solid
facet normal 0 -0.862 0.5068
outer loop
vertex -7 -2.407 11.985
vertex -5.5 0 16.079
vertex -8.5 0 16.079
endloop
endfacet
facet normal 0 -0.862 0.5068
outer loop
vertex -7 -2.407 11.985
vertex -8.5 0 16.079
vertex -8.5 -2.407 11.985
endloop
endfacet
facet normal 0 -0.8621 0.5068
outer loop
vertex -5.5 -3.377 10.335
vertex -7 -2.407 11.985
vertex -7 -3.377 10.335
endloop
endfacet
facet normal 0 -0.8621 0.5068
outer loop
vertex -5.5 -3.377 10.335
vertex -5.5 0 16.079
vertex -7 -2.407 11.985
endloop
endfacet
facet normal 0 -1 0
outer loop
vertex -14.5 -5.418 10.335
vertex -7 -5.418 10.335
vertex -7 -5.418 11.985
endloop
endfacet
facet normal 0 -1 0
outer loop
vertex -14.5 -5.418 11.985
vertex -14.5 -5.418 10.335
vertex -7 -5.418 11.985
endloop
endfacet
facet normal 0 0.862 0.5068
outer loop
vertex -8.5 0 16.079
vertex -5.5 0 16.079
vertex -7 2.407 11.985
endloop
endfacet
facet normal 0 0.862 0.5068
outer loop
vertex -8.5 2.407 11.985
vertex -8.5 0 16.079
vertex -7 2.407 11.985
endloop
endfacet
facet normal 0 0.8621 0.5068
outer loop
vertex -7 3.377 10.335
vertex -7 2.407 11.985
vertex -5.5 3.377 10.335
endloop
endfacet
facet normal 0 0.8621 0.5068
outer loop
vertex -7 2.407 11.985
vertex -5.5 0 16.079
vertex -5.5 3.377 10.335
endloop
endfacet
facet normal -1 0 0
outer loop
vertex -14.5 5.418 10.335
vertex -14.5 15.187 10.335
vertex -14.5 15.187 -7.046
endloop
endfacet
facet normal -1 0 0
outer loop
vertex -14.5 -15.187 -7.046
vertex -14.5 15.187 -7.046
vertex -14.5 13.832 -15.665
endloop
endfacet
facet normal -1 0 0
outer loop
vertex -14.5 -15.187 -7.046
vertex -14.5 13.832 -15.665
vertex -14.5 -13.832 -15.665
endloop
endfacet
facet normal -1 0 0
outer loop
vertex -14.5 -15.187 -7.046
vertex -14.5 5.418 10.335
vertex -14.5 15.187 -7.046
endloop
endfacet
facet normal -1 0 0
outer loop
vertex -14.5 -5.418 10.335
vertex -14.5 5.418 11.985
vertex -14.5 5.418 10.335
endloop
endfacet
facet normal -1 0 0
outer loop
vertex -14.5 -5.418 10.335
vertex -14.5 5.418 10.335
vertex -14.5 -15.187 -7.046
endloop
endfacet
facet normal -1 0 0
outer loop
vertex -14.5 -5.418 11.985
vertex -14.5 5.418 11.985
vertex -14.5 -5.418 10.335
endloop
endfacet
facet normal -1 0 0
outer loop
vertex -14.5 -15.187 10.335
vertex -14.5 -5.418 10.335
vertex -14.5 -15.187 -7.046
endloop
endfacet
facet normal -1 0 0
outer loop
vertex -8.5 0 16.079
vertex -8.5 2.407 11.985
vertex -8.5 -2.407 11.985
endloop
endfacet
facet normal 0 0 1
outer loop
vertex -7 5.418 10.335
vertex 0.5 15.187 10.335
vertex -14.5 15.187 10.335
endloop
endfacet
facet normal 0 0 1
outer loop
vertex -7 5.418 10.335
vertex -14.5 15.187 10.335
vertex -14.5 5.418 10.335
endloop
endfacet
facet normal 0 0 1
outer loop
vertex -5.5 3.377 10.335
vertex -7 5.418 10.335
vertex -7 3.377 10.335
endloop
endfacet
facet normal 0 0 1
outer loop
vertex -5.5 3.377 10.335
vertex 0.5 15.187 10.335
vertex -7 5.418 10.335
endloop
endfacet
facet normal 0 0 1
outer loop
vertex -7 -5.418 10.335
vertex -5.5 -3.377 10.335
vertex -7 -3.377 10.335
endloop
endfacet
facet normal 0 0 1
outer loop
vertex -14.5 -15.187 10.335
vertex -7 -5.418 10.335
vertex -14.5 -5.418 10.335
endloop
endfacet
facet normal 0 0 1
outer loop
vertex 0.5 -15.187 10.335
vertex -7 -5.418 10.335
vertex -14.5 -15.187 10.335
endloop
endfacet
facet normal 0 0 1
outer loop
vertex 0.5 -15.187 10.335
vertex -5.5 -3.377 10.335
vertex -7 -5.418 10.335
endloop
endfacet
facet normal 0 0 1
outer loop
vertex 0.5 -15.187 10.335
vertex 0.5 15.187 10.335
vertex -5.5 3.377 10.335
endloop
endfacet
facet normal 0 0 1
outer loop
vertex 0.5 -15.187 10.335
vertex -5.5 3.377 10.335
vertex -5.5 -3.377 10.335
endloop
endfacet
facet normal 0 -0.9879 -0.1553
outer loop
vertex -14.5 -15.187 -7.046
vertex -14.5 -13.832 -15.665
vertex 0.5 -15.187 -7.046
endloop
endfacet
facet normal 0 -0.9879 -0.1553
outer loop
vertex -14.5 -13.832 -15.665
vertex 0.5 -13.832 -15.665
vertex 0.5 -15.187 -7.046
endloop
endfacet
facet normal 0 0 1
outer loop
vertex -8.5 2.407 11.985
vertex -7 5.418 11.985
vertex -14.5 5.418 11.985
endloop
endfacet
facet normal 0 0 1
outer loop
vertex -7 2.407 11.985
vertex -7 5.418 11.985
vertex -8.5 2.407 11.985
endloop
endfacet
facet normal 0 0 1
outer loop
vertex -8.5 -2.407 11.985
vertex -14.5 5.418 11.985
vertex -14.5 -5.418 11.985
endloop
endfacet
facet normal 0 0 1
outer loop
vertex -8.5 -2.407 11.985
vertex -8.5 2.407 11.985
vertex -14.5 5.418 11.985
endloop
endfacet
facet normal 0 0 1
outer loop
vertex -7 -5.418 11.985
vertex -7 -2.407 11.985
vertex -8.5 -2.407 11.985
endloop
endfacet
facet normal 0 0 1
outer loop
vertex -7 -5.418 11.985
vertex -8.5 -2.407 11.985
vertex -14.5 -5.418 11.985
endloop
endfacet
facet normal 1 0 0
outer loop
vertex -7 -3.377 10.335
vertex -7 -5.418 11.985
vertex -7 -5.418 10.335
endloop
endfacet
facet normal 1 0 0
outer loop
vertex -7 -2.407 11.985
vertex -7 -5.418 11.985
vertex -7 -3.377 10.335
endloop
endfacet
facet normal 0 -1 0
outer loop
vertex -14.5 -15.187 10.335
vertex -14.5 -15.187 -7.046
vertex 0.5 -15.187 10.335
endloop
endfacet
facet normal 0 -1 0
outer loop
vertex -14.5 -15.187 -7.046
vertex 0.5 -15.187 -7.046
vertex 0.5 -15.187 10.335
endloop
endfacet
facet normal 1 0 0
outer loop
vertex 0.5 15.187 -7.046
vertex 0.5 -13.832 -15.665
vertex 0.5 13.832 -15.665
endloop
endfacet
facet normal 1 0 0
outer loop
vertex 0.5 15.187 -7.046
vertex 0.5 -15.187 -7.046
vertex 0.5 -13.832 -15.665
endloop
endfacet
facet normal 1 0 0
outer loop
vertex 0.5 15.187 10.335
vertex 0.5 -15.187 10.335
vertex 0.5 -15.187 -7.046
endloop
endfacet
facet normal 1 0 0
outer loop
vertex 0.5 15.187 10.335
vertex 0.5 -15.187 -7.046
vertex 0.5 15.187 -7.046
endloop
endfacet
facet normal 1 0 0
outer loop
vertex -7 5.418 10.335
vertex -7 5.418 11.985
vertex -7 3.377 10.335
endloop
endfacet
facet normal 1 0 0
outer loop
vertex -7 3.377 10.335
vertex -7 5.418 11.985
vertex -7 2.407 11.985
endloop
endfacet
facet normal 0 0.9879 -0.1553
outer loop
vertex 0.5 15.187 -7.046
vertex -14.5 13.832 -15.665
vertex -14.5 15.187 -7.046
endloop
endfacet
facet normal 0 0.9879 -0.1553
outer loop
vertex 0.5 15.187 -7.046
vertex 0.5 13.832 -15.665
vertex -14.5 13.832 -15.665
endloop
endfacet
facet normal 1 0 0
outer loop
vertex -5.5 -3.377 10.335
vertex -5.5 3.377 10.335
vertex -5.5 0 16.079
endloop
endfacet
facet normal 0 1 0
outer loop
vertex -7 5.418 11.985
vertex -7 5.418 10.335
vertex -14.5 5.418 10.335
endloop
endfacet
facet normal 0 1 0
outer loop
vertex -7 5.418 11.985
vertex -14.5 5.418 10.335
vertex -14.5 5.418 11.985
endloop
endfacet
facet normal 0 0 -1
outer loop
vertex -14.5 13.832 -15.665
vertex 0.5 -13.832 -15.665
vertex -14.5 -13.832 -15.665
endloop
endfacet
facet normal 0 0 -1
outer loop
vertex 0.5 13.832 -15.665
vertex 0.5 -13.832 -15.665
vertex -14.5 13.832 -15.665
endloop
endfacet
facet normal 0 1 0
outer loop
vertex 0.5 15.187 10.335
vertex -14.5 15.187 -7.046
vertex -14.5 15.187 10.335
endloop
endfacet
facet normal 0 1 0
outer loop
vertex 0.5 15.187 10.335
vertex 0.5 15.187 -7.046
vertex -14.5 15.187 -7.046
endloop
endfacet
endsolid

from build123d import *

# Parameters (mm, degrees)
PAD007_DEPTH = 7.5
SKETCH022_W  = 5.417957
SKETCH022_H  = 1.6504247125
PAD008_DEPTH = 7.5
PAD009_DEPTH = 1.5


with BuildPart() as part:
    # Sketch021 → Pad007 (new body, symmetric)
    with BuildSketch(Plane.YZ):
        Polygon((0, -11.6652847125), (-13.832417, -11.6652847125), (-15.186558, -3.04616), (-15.186558, 14.3347152875), (0, 14.3347152875), align=None)
    pad007 = extrude(amount=PAD007_DEPTH, both=True)

    # Sketch022 → Pad008 (join)
    with BuildSketch(Plane.YZ):
        with Locations((-2.7089785, 15.1599276438)):
            Rectangle(SKETCH022_W, SKETCH022_H)
    pad008 = extrude(amount=-PAD008_DEPTH)

    # Sketch023 → Pad009 (join, symmetric)
    with BuildSketch(Plane.YZ):
        Polygon((0, 20.079264), (-3.377041, 14.3347152875), (0, 14.3347152875), align=None)
    pad009 = extrude(amount=PAD009_DEPTH, both=True)

    # Mirrored006: Pad007, Pad008, Pad009 across Sketch021 V_Axis
    add(pad007.mirror(Plane(origin=(0, 0, 0), x_dir=(1, 0, 0), z_dir=(0, 1, 0))))
    add(pad008.mirror(Plane(origin=(0, 0, 0), x_dir=(1, 0, 0), z_dir=(0, 1, 0))))
    add(pad009.mirror(Plane(origin=(0, 0, 0), x_dir=(1, 0, 0), z_dir=(0, 1, 0))))


with BuildPart() as part_1:
    # Body003 placement: moved
    add(part.part.moved(Location((-7, 0, -4))))


solid = part_1.part
